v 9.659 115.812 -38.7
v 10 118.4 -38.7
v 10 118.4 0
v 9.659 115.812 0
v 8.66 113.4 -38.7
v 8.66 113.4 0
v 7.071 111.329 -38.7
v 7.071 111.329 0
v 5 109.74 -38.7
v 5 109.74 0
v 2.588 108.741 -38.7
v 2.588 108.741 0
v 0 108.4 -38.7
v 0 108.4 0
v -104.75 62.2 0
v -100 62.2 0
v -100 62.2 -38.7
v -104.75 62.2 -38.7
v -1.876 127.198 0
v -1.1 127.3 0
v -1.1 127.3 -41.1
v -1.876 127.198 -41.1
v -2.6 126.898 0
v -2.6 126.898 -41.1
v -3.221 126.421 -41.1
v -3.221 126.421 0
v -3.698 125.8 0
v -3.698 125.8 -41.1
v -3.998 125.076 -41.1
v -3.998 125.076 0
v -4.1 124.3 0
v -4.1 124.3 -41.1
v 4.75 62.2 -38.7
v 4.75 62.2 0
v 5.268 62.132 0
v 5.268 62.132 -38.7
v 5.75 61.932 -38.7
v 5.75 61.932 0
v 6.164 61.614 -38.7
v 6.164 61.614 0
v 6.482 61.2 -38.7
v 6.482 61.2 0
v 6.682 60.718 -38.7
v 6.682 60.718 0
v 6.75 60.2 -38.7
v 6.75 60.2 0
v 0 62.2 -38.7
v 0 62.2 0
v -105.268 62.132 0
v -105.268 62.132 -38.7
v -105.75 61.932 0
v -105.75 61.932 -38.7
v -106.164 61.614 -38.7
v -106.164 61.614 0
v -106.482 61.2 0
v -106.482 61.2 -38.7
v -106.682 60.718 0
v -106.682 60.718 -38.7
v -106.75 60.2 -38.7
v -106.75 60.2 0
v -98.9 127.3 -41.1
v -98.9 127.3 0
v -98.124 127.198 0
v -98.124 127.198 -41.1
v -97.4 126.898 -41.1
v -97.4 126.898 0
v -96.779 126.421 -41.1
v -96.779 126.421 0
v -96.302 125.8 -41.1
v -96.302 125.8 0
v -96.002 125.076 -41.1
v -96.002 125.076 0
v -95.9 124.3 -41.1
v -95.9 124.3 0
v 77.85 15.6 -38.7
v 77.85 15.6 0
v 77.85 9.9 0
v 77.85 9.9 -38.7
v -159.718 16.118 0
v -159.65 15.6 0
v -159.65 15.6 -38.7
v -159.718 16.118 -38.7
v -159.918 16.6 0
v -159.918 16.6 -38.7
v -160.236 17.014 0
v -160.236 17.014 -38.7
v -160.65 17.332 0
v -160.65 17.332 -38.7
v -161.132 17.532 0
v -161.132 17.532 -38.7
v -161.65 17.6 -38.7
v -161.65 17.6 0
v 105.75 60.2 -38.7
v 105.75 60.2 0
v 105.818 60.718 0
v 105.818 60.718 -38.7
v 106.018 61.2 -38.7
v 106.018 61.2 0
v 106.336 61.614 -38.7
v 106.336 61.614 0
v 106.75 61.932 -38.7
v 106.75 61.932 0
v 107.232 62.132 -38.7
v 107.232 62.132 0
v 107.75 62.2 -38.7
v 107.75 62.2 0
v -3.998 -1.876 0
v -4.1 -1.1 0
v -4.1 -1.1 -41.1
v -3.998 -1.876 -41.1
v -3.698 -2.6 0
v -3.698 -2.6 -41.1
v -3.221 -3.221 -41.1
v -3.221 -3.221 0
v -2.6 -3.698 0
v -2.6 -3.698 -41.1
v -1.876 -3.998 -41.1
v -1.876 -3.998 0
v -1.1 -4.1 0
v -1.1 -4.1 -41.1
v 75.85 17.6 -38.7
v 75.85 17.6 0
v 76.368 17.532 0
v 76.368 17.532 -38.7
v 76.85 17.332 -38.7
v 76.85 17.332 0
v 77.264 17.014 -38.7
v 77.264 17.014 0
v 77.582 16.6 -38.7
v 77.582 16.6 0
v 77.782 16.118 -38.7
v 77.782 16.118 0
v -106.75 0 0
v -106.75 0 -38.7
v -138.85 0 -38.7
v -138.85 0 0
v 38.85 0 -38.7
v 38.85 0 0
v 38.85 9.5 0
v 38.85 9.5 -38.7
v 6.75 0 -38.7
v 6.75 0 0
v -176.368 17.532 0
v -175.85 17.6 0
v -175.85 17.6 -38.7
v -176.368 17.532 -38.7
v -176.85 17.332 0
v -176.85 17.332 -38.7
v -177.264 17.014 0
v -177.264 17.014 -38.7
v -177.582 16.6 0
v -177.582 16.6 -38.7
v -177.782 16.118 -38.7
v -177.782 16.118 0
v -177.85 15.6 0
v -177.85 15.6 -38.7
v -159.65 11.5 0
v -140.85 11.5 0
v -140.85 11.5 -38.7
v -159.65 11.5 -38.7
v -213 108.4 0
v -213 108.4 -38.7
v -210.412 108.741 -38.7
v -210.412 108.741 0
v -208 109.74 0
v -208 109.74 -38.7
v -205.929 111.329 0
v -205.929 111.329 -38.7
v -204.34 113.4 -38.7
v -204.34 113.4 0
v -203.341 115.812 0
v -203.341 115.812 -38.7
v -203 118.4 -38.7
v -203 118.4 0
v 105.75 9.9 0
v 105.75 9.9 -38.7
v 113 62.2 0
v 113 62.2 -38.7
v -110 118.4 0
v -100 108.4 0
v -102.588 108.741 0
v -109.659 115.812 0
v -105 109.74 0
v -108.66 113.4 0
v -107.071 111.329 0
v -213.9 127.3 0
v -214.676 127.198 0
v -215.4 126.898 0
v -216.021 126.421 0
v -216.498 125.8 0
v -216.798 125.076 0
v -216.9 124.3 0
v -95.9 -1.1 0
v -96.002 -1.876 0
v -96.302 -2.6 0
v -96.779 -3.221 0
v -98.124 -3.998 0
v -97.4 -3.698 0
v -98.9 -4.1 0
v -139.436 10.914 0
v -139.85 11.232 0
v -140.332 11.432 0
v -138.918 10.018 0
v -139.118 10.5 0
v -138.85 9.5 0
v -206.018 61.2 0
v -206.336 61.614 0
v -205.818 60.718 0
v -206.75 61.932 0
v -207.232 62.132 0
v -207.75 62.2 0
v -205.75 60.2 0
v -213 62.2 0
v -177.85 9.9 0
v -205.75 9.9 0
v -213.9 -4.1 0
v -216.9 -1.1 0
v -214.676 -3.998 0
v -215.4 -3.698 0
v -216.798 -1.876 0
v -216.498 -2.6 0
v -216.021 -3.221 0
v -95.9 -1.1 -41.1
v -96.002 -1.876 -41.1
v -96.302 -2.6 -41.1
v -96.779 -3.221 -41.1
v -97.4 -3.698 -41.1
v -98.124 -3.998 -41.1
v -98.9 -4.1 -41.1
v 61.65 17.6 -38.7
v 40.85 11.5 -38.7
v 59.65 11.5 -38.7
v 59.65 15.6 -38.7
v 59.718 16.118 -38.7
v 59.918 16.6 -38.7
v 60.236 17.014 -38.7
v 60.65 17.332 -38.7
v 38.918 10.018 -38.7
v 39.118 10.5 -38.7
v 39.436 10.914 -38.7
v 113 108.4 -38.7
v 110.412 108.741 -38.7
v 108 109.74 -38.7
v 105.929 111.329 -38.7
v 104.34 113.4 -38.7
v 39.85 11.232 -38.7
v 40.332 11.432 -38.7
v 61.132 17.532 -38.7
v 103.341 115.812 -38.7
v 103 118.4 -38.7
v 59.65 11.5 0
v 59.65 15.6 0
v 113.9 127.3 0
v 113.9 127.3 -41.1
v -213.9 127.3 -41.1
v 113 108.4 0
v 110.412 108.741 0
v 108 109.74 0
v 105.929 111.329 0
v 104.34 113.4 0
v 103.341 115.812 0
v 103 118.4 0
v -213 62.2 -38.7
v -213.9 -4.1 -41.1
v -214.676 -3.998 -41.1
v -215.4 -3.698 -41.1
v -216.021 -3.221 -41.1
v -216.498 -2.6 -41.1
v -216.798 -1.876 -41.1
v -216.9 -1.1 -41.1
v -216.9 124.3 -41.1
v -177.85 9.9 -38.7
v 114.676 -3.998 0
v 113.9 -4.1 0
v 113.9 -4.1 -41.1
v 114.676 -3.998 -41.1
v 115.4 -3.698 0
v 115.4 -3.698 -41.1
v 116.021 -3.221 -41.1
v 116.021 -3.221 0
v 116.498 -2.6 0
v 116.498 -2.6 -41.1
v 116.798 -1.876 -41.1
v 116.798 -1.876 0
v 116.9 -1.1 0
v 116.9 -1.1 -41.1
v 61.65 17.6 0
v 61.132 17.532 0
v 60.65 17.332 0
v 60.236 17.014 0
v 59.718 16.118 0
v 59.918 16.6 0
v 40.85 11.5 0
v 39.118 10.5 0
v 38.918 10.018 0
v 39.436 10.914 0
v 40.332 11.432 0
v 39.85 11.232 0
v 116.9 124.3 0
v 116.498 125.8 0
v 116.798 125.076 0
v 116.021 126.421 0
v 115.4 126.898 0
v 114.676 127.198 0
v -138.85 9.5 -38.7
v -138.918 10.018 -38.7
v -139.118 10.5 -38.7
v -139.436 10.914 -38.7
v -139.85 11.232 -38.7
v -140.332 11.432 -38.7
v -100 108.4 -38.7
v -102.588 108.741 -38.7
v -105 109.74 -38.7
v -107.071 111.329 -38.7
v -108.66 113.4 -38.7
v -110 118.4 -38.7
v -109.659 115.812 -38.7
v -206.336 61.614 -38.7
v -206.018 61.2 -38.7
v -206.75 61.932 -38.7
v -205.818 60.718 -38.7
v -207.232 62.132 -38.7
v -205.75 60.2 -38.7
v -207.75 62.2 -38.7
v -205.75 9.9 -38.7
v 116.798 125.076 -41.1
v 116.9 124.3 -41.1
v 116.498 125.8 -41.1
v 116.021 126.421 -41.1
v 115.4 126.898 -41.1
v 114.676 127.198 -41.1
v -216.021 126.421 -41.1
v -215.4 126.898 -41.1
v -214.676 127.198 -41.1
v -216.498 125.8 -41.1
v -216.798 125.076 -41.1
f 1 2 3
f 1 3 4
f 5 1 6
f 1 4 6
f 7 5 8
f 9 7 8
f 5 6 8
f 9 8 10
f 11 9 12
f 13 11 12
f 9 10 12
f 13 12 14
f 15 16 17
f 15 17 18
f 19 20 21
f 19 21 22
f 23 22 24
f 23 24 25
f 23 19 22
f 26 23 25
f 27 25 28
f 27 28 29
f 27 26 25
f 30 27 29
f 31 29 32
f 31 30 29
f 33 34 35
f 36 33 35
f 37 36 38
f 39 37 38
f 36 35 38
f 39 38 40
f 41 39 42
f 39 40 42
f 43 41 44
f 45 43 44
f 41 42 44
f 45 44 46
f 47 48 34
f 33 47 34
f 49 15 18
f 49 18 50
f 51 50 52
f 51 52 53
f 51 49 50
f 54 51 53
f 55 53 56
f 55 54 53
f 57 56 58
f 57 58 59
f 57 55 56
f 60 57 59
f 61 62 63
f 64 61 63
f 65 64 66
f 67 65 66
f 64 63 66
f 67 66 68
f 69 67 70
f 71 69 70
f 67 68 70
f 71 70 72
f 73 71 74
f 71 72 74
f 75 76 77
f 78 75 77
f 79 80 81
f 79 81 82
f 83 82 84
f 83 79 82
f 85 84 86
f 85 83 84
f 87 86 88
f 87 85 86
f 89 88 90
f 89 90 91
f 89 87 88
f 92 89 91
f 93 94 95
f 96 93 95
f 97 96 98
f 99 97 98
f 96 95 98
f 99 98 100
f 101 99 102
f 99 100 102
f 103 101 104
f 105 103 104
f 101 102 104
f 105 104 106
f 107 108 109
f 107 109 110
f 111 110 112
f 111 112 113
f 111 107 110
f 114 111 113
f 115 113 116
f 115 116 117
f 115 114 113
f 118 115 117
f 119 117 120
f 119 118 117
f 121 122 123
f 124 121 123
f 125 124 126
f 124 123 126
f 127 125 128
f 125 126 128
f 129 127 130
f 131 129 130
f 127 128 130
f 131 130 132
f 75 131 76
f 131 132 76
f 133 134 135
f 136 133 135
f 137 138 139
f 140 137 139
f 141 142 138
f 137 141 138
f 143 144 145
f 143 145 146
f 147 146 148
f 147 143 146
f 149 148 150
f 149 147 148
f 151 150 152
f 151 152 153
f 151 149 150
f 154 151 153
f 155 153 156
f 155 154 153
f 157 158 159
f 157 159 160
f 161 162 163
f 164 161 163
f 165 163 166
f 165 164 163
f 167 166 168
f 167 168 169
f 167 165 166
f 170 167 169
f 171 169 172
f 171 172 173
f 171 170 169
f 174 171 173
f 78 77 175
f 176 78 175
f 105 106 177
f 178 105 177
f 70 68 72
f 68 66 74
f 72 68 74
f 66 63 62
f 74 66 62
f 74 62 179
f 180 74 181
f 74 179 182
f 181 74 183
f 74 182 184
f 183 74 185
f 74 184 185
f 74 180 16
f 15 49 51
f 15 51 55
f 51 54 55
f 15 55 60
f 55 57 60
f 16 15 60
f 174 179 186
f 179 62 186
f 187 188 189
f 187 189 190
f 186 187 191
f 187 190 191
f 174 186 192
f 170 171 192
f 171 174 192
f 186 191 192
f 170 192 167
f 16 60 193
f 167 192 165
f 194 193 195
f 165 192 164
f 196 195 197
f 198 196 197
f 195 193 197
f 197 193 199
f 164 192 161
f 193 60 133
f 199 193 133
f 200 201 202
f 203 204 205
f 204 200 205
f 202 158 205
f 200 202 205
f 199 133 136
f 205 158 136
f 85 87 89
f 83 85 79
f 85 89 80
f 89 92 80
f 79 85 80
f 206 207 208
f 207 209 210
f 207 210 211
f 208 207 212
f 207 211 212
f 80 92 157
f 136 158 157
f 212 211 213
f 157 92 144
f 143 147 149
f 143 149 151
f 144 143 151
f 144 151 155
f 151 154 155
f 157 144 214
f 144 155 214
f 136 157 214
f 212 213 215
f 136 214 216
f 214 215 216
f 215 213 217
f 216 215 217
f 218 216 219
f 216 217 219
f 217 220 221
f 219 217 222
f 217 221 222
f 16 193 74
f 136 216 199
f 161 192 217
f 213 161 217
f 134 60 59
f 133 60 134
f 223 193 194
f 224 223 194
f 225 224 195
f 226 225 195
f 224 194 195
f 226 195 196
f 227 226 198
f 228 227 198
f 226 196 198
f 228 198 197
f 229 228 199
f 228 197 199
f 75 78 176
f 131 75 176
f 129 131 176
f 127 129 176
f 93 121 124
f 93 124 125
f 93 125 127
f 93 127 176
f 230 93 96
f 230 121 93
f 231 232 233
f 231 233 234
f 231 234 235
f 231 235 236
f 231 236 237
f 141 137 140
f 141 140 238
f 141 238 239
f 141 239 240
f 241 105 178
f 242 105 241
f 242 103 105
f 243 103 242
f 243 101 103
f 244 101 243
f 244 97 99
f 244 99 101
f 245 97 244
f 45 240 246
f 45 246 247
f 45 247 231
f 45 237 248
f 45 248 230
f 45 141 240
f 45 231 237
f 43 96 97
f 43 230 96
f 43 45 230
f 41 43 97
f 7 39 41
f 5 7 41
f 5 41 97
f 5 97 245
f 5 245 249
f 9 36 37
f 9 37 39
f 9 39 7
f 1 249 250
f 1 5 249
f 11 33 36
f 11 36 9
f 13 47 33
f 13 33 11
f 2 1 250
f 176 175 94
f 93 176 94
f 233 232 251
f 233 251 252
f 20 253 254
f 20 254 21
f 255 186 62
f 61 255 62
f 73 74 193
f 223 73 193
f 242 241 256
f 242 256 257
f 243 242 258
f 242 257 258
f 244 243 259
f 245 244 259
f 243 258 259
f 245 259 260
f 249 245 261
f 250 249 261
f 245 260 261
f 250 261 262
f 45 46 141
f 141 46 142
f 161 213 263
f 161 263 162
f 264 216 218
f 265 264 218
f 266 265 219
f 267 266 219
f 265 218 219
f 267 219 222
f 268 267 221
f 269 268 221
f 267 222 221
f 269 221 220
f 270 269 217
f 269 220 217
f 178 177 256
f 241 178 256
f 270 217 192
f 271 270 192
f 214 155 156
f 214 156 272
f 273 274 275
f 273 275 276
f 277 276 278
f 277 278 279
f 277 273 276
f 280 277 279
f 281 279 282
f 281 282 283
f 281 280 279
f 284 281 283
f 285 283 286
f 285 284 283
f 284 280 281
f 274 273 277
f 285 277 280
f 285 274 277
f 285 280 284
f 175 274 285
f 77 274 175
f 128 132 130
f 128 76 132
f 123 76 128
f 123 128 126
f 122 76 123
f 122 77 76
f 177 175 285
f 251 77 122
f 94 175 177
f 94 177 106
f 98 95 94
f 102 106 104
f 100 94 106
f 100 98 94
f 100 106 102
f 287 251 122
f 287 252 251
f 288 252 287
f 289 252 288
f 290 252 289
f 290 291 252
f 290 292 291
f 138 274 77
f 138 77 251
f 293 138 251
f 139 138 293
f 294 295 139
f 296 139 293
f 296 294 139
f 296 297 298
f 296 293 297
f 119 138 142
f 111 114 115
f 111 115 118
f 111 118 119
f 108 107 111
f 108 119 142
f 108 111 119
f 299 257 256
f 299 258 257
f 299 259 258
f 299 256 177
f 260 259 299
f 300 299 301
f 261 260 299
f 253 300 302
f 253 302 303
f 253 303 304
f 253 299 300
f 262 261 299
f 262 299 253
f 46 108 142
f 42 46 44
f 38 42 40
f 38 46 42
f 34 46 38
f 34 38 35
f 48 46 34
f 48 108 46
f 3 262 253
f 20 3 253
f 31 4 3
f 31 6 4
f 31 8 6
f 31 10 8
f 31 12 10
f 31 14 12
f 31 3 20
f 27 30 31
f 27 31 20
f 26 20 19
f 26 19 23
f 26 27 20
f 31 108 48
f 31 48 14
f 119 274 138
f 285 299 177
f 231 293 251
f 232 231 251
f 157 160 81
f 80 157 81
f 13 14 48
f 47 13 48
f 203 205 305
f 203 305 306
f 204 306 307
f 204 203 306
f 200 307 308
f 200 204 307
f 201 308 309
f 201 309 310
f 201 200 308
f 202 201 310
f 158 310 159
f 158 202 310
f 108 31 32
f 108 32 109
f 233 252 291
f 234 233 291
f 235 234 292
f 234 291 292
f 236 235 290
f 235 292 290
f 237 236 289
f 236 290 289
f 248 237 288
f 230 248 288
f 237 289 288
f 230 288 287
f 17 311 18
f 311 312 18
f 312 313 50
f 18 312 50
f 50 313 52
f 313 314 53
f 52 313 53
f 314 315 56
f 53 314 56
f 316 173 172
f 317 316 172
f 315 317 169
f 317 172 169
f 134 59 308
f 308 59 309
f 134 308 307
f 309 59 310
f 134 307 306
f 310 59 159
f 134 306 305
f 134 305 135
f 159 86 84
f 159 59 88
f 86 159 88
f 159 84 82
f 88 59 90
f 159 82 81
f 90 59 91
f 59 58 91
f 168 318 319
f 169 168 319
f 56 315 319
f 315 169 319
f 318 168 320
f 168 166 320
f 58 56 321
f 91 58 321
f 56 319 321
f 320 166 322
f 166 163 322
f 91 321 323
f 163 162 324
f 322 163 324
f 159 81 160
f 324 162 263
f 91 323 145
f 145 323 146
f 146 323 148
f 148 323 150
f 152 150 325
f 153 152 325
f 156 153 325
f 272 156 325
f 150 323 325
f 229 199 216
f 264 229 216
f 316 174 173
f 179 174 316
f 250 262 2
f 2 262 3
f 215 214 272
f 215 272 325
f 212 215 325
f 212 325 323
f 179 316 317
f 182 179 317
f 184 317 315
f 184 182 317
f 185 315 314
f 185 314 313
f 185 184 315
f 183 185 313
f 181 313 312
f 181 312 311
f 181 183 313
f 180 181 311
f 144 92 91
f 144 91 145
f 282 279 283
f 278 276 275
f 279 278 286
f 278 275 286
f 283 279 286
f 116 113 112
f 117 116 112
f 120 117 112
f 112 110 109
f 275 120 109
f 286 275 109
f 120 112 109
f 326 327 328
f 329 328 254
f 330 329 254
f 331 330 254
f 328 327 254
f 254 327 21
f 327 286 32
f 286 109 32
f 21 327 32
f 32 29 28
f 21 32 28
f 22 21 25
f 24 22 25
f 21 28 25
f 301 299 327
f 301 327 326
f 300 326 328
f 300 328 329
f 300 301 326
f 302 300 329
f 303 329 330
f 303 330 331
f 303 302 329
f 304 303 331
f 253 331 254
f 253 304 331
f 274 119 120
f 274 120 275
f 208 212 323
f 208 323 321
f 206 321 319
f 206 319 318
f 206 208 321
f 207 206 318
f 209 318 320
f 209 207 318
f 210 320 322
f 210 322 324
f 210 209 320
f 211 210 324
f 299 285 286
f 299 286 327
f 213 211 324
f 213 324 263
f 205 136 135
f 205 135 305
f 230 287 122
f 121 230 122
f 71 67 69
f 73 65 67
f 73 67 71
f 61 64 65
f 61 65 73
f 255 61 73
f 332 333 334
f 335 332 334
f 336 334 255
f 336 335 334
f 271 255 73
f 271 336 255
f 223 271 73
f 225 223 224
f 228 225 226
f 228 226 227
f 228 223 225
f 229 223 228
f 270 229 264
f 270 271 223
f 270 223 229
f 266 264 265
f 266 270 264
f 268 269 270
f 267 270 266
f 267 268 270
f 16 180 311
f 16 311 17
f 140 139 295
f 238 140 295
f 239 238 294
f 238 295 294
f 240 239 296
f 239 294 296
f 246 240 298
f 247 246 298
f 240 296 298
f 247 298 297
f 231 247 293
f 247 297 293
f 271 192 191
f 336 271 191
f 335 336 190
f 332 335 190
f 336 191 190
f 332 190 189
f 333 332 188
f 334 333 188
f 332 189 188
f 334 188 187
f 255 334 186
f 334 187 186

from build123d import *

# Parameters (mm, degrees)
PAD_DEPTH       = 41.1
POCKET_DEPTH    = 38.7
PAD001_DEPTH    = 41.1
POCKET001_DEPTH = 38.7


with BuildPart() as right_part:
    # Binder → Pad (new body)
    with BuildSketch(Plane(origin=(56.4, 61.6, 0), x_dir=(0, 1, 0), z_dir=(0, 0, 1))):
        with BuildLine():
            Line((62.7, 60.5), (-62.7, 60.5))
            ThreePointArc((-62.7, 60.5), (-64.82132, 59.62132), (-65.7, 57.5))
            Line((-65.7, 57.5), (-65.7, -57.5))
            ThreePointArc((-65.7, -57.5), (-64.82132, -59.62132), (-62.7, -60.5))
            Line((-62.7, -60.5), (62.7, -60.5))
            ThreePointArc((62.7, -60.5), (64.82132, -59.62132), (65.7, -57.5))
            Line((65.7, -57.5), (65.7, 57.5))
            ThreePointArc((65.7, 57.5), (64.82132, 59.62132), (62.7, 60.5))
        make_face()
    extrude(amount=-PAD_DEPTH)

    # Binder001 → Pocket (cut)
    with BuildSketch(Plane(origin=(56.5, 59.2, 0), x_dir=(0, 1, 0), z_dir=(0, 0, 1))):
        with BuildLine():
            Line((49.2, 56.5), (3, 56.5))
            Line((3, 56.5), (3, 51.75))
            ThreePointArc((3, 51.75), (2.414214, 50.335786), (1, 49.75))
            Line((1, 49.75), (-59.2, 49.75))
            Line((-59.2, 49.75), (-59.2, 17.65))
            Line((-59.2, 17.65), (-49.7, 17.65))
            ThreePointArc((-49.7, 17.65), (-48.285786, 17.064214), (-47.7, 15.65))
            Line((-47.7, 15.65), (-47.7, -3.15))
            Line((-47.7, -3.15), (-43.6, -3.15))
            ThreePointArc((-43.6, -3.15), (-42.185786, -3.735786), (-41.6, -5.15))
            Line((-41.6, -5.15), (-41.6, -19.35))
            ThreePointArc((-41.6, -19.35), (-42.185786, -20.764214), (-43.6, -21.35))
            Line((-43.6, -21.35), (-49.3, -21.35))
            Line((-49.3, -21.35), (-49.3, -49.25))
            Line((-49.3, -49.25), (1, -49.25))
            ThreePointArc((1, -49.25), (2.414214, -49.835786), (3, -51.25))
            Line((3, -51.25), (3, -56.5))
            Line((3, -56.5), (49.2, -56.5))
            ThreePointArc((49.2, -56.5), (52.128932, -49.428932), (59.2, -46.5))
            Line((59.2, -46.5), (59.2, 46.5))
            ThreePointArc((59.2, 46.5), (52.128932, 49.428932), (49.2, 56.5))
        make_face()
    extrude(amount=-POCKET_DEPTH, mode=Mode.SUBTRACT)


with BuildPart() as left_part:
    # Binder002 → Pad001 (new body)
    with BuildSketch(Plane(origin=(-156.4, 61.6, 0), x_dir=(0, 1, 0), z_dir=(0, 0, 1))):
        with BuildLine():
            Line((62.7, -60.5), (-62.7, -60.5))
            ThreePointArc((-62.7, -60.5), (-64.82132, -59.62132), (-65.7, -57.5))
            Line((-65.7, -57.5), (-65.7, 57.5))
            ThreePointArc((-65.7, 57.5), (-64.82132, 59.62132), (-62.7, 60.5))
            Line((-62.7, 60.5), (62.7, 60.5))
            ThreePointArc((62.7, 60.5), (64.82132, 59.62132), (65.7, 57.5))
            Line((65.7, 57.5), (65.7, -57.5))
            ThreePointArc((65.7, -57.5), (64.82132, -59.62132), (62.7, -60.5))
        make_face()
    extrude(amount=-PAD001_DEPTH)

    # Binder003 → Pocket001 (cut)
    with BuildSketch(Plane(origin=(-156.5, 59.2, 0), x_dir=(0, 1, 0), z_dir=(0, 0, 1))):
        with BuildLine():
            Line((49.2, -56.5), (3, -56.5))
            Line((3, -56.5), (3, -51.75))
            ThreePointArc((3, -51.75), (2.414214, -50.335786), (1, -49.75))
            Line((1, -49.75), (-59.2, -49.75))
            Line((-59.2, -49.75), (-59.2, -17.65))
            Line((-59.2, -17.65), (-49.7, -17.65))
            ThreePointArc((-49.7, -17.65), (-48.285786, -17.064214), (-47.7, -15.65))
            Line((-47.7, -15.65), (-47.7, 3.15))
            Line((-47.7, 3.15), (-43.6, 3.15))
            ThreePointArc((-43.6, 3.15), (-42.185786, 3.735786), (-41.6, 5.15))
            Line((-41.6, 5.15), (-41.6, 19.35))
            ThreePointArc((-41.6, 19.35), (-42.185786, 20.764214), (-43.6, 21.35))
            Line((-43.6, 21.35), (-49.3, 21.35))
            Line((-49.3, 21.35), (-49.3, 49.25))
            Line((-49.3, 49.25), (1, 49.25))
            ThreePointArc((1, 49.25), (2.414214, 49.835786), (3, 51.25))
            Line((3, 51.25), (3, 56.5))
            Line((3, 56.5), (49.2, 56.5))
            ThreePointArc((49.2, 56.5), (52.128932, 49.428932), (59.2, 46.5))
            Line((59.2, 46.5), (59.2, -46.5))
            ThreePointArc((59.2, -46.5), (52.128932, -49.428932), (49.2, -56.5))
        make_face()
    extrude(amount=-POCKET001_DEPTH, mode=Mode.SUBTRACT)


solid = Compound([right_part.part, left_part.part])
